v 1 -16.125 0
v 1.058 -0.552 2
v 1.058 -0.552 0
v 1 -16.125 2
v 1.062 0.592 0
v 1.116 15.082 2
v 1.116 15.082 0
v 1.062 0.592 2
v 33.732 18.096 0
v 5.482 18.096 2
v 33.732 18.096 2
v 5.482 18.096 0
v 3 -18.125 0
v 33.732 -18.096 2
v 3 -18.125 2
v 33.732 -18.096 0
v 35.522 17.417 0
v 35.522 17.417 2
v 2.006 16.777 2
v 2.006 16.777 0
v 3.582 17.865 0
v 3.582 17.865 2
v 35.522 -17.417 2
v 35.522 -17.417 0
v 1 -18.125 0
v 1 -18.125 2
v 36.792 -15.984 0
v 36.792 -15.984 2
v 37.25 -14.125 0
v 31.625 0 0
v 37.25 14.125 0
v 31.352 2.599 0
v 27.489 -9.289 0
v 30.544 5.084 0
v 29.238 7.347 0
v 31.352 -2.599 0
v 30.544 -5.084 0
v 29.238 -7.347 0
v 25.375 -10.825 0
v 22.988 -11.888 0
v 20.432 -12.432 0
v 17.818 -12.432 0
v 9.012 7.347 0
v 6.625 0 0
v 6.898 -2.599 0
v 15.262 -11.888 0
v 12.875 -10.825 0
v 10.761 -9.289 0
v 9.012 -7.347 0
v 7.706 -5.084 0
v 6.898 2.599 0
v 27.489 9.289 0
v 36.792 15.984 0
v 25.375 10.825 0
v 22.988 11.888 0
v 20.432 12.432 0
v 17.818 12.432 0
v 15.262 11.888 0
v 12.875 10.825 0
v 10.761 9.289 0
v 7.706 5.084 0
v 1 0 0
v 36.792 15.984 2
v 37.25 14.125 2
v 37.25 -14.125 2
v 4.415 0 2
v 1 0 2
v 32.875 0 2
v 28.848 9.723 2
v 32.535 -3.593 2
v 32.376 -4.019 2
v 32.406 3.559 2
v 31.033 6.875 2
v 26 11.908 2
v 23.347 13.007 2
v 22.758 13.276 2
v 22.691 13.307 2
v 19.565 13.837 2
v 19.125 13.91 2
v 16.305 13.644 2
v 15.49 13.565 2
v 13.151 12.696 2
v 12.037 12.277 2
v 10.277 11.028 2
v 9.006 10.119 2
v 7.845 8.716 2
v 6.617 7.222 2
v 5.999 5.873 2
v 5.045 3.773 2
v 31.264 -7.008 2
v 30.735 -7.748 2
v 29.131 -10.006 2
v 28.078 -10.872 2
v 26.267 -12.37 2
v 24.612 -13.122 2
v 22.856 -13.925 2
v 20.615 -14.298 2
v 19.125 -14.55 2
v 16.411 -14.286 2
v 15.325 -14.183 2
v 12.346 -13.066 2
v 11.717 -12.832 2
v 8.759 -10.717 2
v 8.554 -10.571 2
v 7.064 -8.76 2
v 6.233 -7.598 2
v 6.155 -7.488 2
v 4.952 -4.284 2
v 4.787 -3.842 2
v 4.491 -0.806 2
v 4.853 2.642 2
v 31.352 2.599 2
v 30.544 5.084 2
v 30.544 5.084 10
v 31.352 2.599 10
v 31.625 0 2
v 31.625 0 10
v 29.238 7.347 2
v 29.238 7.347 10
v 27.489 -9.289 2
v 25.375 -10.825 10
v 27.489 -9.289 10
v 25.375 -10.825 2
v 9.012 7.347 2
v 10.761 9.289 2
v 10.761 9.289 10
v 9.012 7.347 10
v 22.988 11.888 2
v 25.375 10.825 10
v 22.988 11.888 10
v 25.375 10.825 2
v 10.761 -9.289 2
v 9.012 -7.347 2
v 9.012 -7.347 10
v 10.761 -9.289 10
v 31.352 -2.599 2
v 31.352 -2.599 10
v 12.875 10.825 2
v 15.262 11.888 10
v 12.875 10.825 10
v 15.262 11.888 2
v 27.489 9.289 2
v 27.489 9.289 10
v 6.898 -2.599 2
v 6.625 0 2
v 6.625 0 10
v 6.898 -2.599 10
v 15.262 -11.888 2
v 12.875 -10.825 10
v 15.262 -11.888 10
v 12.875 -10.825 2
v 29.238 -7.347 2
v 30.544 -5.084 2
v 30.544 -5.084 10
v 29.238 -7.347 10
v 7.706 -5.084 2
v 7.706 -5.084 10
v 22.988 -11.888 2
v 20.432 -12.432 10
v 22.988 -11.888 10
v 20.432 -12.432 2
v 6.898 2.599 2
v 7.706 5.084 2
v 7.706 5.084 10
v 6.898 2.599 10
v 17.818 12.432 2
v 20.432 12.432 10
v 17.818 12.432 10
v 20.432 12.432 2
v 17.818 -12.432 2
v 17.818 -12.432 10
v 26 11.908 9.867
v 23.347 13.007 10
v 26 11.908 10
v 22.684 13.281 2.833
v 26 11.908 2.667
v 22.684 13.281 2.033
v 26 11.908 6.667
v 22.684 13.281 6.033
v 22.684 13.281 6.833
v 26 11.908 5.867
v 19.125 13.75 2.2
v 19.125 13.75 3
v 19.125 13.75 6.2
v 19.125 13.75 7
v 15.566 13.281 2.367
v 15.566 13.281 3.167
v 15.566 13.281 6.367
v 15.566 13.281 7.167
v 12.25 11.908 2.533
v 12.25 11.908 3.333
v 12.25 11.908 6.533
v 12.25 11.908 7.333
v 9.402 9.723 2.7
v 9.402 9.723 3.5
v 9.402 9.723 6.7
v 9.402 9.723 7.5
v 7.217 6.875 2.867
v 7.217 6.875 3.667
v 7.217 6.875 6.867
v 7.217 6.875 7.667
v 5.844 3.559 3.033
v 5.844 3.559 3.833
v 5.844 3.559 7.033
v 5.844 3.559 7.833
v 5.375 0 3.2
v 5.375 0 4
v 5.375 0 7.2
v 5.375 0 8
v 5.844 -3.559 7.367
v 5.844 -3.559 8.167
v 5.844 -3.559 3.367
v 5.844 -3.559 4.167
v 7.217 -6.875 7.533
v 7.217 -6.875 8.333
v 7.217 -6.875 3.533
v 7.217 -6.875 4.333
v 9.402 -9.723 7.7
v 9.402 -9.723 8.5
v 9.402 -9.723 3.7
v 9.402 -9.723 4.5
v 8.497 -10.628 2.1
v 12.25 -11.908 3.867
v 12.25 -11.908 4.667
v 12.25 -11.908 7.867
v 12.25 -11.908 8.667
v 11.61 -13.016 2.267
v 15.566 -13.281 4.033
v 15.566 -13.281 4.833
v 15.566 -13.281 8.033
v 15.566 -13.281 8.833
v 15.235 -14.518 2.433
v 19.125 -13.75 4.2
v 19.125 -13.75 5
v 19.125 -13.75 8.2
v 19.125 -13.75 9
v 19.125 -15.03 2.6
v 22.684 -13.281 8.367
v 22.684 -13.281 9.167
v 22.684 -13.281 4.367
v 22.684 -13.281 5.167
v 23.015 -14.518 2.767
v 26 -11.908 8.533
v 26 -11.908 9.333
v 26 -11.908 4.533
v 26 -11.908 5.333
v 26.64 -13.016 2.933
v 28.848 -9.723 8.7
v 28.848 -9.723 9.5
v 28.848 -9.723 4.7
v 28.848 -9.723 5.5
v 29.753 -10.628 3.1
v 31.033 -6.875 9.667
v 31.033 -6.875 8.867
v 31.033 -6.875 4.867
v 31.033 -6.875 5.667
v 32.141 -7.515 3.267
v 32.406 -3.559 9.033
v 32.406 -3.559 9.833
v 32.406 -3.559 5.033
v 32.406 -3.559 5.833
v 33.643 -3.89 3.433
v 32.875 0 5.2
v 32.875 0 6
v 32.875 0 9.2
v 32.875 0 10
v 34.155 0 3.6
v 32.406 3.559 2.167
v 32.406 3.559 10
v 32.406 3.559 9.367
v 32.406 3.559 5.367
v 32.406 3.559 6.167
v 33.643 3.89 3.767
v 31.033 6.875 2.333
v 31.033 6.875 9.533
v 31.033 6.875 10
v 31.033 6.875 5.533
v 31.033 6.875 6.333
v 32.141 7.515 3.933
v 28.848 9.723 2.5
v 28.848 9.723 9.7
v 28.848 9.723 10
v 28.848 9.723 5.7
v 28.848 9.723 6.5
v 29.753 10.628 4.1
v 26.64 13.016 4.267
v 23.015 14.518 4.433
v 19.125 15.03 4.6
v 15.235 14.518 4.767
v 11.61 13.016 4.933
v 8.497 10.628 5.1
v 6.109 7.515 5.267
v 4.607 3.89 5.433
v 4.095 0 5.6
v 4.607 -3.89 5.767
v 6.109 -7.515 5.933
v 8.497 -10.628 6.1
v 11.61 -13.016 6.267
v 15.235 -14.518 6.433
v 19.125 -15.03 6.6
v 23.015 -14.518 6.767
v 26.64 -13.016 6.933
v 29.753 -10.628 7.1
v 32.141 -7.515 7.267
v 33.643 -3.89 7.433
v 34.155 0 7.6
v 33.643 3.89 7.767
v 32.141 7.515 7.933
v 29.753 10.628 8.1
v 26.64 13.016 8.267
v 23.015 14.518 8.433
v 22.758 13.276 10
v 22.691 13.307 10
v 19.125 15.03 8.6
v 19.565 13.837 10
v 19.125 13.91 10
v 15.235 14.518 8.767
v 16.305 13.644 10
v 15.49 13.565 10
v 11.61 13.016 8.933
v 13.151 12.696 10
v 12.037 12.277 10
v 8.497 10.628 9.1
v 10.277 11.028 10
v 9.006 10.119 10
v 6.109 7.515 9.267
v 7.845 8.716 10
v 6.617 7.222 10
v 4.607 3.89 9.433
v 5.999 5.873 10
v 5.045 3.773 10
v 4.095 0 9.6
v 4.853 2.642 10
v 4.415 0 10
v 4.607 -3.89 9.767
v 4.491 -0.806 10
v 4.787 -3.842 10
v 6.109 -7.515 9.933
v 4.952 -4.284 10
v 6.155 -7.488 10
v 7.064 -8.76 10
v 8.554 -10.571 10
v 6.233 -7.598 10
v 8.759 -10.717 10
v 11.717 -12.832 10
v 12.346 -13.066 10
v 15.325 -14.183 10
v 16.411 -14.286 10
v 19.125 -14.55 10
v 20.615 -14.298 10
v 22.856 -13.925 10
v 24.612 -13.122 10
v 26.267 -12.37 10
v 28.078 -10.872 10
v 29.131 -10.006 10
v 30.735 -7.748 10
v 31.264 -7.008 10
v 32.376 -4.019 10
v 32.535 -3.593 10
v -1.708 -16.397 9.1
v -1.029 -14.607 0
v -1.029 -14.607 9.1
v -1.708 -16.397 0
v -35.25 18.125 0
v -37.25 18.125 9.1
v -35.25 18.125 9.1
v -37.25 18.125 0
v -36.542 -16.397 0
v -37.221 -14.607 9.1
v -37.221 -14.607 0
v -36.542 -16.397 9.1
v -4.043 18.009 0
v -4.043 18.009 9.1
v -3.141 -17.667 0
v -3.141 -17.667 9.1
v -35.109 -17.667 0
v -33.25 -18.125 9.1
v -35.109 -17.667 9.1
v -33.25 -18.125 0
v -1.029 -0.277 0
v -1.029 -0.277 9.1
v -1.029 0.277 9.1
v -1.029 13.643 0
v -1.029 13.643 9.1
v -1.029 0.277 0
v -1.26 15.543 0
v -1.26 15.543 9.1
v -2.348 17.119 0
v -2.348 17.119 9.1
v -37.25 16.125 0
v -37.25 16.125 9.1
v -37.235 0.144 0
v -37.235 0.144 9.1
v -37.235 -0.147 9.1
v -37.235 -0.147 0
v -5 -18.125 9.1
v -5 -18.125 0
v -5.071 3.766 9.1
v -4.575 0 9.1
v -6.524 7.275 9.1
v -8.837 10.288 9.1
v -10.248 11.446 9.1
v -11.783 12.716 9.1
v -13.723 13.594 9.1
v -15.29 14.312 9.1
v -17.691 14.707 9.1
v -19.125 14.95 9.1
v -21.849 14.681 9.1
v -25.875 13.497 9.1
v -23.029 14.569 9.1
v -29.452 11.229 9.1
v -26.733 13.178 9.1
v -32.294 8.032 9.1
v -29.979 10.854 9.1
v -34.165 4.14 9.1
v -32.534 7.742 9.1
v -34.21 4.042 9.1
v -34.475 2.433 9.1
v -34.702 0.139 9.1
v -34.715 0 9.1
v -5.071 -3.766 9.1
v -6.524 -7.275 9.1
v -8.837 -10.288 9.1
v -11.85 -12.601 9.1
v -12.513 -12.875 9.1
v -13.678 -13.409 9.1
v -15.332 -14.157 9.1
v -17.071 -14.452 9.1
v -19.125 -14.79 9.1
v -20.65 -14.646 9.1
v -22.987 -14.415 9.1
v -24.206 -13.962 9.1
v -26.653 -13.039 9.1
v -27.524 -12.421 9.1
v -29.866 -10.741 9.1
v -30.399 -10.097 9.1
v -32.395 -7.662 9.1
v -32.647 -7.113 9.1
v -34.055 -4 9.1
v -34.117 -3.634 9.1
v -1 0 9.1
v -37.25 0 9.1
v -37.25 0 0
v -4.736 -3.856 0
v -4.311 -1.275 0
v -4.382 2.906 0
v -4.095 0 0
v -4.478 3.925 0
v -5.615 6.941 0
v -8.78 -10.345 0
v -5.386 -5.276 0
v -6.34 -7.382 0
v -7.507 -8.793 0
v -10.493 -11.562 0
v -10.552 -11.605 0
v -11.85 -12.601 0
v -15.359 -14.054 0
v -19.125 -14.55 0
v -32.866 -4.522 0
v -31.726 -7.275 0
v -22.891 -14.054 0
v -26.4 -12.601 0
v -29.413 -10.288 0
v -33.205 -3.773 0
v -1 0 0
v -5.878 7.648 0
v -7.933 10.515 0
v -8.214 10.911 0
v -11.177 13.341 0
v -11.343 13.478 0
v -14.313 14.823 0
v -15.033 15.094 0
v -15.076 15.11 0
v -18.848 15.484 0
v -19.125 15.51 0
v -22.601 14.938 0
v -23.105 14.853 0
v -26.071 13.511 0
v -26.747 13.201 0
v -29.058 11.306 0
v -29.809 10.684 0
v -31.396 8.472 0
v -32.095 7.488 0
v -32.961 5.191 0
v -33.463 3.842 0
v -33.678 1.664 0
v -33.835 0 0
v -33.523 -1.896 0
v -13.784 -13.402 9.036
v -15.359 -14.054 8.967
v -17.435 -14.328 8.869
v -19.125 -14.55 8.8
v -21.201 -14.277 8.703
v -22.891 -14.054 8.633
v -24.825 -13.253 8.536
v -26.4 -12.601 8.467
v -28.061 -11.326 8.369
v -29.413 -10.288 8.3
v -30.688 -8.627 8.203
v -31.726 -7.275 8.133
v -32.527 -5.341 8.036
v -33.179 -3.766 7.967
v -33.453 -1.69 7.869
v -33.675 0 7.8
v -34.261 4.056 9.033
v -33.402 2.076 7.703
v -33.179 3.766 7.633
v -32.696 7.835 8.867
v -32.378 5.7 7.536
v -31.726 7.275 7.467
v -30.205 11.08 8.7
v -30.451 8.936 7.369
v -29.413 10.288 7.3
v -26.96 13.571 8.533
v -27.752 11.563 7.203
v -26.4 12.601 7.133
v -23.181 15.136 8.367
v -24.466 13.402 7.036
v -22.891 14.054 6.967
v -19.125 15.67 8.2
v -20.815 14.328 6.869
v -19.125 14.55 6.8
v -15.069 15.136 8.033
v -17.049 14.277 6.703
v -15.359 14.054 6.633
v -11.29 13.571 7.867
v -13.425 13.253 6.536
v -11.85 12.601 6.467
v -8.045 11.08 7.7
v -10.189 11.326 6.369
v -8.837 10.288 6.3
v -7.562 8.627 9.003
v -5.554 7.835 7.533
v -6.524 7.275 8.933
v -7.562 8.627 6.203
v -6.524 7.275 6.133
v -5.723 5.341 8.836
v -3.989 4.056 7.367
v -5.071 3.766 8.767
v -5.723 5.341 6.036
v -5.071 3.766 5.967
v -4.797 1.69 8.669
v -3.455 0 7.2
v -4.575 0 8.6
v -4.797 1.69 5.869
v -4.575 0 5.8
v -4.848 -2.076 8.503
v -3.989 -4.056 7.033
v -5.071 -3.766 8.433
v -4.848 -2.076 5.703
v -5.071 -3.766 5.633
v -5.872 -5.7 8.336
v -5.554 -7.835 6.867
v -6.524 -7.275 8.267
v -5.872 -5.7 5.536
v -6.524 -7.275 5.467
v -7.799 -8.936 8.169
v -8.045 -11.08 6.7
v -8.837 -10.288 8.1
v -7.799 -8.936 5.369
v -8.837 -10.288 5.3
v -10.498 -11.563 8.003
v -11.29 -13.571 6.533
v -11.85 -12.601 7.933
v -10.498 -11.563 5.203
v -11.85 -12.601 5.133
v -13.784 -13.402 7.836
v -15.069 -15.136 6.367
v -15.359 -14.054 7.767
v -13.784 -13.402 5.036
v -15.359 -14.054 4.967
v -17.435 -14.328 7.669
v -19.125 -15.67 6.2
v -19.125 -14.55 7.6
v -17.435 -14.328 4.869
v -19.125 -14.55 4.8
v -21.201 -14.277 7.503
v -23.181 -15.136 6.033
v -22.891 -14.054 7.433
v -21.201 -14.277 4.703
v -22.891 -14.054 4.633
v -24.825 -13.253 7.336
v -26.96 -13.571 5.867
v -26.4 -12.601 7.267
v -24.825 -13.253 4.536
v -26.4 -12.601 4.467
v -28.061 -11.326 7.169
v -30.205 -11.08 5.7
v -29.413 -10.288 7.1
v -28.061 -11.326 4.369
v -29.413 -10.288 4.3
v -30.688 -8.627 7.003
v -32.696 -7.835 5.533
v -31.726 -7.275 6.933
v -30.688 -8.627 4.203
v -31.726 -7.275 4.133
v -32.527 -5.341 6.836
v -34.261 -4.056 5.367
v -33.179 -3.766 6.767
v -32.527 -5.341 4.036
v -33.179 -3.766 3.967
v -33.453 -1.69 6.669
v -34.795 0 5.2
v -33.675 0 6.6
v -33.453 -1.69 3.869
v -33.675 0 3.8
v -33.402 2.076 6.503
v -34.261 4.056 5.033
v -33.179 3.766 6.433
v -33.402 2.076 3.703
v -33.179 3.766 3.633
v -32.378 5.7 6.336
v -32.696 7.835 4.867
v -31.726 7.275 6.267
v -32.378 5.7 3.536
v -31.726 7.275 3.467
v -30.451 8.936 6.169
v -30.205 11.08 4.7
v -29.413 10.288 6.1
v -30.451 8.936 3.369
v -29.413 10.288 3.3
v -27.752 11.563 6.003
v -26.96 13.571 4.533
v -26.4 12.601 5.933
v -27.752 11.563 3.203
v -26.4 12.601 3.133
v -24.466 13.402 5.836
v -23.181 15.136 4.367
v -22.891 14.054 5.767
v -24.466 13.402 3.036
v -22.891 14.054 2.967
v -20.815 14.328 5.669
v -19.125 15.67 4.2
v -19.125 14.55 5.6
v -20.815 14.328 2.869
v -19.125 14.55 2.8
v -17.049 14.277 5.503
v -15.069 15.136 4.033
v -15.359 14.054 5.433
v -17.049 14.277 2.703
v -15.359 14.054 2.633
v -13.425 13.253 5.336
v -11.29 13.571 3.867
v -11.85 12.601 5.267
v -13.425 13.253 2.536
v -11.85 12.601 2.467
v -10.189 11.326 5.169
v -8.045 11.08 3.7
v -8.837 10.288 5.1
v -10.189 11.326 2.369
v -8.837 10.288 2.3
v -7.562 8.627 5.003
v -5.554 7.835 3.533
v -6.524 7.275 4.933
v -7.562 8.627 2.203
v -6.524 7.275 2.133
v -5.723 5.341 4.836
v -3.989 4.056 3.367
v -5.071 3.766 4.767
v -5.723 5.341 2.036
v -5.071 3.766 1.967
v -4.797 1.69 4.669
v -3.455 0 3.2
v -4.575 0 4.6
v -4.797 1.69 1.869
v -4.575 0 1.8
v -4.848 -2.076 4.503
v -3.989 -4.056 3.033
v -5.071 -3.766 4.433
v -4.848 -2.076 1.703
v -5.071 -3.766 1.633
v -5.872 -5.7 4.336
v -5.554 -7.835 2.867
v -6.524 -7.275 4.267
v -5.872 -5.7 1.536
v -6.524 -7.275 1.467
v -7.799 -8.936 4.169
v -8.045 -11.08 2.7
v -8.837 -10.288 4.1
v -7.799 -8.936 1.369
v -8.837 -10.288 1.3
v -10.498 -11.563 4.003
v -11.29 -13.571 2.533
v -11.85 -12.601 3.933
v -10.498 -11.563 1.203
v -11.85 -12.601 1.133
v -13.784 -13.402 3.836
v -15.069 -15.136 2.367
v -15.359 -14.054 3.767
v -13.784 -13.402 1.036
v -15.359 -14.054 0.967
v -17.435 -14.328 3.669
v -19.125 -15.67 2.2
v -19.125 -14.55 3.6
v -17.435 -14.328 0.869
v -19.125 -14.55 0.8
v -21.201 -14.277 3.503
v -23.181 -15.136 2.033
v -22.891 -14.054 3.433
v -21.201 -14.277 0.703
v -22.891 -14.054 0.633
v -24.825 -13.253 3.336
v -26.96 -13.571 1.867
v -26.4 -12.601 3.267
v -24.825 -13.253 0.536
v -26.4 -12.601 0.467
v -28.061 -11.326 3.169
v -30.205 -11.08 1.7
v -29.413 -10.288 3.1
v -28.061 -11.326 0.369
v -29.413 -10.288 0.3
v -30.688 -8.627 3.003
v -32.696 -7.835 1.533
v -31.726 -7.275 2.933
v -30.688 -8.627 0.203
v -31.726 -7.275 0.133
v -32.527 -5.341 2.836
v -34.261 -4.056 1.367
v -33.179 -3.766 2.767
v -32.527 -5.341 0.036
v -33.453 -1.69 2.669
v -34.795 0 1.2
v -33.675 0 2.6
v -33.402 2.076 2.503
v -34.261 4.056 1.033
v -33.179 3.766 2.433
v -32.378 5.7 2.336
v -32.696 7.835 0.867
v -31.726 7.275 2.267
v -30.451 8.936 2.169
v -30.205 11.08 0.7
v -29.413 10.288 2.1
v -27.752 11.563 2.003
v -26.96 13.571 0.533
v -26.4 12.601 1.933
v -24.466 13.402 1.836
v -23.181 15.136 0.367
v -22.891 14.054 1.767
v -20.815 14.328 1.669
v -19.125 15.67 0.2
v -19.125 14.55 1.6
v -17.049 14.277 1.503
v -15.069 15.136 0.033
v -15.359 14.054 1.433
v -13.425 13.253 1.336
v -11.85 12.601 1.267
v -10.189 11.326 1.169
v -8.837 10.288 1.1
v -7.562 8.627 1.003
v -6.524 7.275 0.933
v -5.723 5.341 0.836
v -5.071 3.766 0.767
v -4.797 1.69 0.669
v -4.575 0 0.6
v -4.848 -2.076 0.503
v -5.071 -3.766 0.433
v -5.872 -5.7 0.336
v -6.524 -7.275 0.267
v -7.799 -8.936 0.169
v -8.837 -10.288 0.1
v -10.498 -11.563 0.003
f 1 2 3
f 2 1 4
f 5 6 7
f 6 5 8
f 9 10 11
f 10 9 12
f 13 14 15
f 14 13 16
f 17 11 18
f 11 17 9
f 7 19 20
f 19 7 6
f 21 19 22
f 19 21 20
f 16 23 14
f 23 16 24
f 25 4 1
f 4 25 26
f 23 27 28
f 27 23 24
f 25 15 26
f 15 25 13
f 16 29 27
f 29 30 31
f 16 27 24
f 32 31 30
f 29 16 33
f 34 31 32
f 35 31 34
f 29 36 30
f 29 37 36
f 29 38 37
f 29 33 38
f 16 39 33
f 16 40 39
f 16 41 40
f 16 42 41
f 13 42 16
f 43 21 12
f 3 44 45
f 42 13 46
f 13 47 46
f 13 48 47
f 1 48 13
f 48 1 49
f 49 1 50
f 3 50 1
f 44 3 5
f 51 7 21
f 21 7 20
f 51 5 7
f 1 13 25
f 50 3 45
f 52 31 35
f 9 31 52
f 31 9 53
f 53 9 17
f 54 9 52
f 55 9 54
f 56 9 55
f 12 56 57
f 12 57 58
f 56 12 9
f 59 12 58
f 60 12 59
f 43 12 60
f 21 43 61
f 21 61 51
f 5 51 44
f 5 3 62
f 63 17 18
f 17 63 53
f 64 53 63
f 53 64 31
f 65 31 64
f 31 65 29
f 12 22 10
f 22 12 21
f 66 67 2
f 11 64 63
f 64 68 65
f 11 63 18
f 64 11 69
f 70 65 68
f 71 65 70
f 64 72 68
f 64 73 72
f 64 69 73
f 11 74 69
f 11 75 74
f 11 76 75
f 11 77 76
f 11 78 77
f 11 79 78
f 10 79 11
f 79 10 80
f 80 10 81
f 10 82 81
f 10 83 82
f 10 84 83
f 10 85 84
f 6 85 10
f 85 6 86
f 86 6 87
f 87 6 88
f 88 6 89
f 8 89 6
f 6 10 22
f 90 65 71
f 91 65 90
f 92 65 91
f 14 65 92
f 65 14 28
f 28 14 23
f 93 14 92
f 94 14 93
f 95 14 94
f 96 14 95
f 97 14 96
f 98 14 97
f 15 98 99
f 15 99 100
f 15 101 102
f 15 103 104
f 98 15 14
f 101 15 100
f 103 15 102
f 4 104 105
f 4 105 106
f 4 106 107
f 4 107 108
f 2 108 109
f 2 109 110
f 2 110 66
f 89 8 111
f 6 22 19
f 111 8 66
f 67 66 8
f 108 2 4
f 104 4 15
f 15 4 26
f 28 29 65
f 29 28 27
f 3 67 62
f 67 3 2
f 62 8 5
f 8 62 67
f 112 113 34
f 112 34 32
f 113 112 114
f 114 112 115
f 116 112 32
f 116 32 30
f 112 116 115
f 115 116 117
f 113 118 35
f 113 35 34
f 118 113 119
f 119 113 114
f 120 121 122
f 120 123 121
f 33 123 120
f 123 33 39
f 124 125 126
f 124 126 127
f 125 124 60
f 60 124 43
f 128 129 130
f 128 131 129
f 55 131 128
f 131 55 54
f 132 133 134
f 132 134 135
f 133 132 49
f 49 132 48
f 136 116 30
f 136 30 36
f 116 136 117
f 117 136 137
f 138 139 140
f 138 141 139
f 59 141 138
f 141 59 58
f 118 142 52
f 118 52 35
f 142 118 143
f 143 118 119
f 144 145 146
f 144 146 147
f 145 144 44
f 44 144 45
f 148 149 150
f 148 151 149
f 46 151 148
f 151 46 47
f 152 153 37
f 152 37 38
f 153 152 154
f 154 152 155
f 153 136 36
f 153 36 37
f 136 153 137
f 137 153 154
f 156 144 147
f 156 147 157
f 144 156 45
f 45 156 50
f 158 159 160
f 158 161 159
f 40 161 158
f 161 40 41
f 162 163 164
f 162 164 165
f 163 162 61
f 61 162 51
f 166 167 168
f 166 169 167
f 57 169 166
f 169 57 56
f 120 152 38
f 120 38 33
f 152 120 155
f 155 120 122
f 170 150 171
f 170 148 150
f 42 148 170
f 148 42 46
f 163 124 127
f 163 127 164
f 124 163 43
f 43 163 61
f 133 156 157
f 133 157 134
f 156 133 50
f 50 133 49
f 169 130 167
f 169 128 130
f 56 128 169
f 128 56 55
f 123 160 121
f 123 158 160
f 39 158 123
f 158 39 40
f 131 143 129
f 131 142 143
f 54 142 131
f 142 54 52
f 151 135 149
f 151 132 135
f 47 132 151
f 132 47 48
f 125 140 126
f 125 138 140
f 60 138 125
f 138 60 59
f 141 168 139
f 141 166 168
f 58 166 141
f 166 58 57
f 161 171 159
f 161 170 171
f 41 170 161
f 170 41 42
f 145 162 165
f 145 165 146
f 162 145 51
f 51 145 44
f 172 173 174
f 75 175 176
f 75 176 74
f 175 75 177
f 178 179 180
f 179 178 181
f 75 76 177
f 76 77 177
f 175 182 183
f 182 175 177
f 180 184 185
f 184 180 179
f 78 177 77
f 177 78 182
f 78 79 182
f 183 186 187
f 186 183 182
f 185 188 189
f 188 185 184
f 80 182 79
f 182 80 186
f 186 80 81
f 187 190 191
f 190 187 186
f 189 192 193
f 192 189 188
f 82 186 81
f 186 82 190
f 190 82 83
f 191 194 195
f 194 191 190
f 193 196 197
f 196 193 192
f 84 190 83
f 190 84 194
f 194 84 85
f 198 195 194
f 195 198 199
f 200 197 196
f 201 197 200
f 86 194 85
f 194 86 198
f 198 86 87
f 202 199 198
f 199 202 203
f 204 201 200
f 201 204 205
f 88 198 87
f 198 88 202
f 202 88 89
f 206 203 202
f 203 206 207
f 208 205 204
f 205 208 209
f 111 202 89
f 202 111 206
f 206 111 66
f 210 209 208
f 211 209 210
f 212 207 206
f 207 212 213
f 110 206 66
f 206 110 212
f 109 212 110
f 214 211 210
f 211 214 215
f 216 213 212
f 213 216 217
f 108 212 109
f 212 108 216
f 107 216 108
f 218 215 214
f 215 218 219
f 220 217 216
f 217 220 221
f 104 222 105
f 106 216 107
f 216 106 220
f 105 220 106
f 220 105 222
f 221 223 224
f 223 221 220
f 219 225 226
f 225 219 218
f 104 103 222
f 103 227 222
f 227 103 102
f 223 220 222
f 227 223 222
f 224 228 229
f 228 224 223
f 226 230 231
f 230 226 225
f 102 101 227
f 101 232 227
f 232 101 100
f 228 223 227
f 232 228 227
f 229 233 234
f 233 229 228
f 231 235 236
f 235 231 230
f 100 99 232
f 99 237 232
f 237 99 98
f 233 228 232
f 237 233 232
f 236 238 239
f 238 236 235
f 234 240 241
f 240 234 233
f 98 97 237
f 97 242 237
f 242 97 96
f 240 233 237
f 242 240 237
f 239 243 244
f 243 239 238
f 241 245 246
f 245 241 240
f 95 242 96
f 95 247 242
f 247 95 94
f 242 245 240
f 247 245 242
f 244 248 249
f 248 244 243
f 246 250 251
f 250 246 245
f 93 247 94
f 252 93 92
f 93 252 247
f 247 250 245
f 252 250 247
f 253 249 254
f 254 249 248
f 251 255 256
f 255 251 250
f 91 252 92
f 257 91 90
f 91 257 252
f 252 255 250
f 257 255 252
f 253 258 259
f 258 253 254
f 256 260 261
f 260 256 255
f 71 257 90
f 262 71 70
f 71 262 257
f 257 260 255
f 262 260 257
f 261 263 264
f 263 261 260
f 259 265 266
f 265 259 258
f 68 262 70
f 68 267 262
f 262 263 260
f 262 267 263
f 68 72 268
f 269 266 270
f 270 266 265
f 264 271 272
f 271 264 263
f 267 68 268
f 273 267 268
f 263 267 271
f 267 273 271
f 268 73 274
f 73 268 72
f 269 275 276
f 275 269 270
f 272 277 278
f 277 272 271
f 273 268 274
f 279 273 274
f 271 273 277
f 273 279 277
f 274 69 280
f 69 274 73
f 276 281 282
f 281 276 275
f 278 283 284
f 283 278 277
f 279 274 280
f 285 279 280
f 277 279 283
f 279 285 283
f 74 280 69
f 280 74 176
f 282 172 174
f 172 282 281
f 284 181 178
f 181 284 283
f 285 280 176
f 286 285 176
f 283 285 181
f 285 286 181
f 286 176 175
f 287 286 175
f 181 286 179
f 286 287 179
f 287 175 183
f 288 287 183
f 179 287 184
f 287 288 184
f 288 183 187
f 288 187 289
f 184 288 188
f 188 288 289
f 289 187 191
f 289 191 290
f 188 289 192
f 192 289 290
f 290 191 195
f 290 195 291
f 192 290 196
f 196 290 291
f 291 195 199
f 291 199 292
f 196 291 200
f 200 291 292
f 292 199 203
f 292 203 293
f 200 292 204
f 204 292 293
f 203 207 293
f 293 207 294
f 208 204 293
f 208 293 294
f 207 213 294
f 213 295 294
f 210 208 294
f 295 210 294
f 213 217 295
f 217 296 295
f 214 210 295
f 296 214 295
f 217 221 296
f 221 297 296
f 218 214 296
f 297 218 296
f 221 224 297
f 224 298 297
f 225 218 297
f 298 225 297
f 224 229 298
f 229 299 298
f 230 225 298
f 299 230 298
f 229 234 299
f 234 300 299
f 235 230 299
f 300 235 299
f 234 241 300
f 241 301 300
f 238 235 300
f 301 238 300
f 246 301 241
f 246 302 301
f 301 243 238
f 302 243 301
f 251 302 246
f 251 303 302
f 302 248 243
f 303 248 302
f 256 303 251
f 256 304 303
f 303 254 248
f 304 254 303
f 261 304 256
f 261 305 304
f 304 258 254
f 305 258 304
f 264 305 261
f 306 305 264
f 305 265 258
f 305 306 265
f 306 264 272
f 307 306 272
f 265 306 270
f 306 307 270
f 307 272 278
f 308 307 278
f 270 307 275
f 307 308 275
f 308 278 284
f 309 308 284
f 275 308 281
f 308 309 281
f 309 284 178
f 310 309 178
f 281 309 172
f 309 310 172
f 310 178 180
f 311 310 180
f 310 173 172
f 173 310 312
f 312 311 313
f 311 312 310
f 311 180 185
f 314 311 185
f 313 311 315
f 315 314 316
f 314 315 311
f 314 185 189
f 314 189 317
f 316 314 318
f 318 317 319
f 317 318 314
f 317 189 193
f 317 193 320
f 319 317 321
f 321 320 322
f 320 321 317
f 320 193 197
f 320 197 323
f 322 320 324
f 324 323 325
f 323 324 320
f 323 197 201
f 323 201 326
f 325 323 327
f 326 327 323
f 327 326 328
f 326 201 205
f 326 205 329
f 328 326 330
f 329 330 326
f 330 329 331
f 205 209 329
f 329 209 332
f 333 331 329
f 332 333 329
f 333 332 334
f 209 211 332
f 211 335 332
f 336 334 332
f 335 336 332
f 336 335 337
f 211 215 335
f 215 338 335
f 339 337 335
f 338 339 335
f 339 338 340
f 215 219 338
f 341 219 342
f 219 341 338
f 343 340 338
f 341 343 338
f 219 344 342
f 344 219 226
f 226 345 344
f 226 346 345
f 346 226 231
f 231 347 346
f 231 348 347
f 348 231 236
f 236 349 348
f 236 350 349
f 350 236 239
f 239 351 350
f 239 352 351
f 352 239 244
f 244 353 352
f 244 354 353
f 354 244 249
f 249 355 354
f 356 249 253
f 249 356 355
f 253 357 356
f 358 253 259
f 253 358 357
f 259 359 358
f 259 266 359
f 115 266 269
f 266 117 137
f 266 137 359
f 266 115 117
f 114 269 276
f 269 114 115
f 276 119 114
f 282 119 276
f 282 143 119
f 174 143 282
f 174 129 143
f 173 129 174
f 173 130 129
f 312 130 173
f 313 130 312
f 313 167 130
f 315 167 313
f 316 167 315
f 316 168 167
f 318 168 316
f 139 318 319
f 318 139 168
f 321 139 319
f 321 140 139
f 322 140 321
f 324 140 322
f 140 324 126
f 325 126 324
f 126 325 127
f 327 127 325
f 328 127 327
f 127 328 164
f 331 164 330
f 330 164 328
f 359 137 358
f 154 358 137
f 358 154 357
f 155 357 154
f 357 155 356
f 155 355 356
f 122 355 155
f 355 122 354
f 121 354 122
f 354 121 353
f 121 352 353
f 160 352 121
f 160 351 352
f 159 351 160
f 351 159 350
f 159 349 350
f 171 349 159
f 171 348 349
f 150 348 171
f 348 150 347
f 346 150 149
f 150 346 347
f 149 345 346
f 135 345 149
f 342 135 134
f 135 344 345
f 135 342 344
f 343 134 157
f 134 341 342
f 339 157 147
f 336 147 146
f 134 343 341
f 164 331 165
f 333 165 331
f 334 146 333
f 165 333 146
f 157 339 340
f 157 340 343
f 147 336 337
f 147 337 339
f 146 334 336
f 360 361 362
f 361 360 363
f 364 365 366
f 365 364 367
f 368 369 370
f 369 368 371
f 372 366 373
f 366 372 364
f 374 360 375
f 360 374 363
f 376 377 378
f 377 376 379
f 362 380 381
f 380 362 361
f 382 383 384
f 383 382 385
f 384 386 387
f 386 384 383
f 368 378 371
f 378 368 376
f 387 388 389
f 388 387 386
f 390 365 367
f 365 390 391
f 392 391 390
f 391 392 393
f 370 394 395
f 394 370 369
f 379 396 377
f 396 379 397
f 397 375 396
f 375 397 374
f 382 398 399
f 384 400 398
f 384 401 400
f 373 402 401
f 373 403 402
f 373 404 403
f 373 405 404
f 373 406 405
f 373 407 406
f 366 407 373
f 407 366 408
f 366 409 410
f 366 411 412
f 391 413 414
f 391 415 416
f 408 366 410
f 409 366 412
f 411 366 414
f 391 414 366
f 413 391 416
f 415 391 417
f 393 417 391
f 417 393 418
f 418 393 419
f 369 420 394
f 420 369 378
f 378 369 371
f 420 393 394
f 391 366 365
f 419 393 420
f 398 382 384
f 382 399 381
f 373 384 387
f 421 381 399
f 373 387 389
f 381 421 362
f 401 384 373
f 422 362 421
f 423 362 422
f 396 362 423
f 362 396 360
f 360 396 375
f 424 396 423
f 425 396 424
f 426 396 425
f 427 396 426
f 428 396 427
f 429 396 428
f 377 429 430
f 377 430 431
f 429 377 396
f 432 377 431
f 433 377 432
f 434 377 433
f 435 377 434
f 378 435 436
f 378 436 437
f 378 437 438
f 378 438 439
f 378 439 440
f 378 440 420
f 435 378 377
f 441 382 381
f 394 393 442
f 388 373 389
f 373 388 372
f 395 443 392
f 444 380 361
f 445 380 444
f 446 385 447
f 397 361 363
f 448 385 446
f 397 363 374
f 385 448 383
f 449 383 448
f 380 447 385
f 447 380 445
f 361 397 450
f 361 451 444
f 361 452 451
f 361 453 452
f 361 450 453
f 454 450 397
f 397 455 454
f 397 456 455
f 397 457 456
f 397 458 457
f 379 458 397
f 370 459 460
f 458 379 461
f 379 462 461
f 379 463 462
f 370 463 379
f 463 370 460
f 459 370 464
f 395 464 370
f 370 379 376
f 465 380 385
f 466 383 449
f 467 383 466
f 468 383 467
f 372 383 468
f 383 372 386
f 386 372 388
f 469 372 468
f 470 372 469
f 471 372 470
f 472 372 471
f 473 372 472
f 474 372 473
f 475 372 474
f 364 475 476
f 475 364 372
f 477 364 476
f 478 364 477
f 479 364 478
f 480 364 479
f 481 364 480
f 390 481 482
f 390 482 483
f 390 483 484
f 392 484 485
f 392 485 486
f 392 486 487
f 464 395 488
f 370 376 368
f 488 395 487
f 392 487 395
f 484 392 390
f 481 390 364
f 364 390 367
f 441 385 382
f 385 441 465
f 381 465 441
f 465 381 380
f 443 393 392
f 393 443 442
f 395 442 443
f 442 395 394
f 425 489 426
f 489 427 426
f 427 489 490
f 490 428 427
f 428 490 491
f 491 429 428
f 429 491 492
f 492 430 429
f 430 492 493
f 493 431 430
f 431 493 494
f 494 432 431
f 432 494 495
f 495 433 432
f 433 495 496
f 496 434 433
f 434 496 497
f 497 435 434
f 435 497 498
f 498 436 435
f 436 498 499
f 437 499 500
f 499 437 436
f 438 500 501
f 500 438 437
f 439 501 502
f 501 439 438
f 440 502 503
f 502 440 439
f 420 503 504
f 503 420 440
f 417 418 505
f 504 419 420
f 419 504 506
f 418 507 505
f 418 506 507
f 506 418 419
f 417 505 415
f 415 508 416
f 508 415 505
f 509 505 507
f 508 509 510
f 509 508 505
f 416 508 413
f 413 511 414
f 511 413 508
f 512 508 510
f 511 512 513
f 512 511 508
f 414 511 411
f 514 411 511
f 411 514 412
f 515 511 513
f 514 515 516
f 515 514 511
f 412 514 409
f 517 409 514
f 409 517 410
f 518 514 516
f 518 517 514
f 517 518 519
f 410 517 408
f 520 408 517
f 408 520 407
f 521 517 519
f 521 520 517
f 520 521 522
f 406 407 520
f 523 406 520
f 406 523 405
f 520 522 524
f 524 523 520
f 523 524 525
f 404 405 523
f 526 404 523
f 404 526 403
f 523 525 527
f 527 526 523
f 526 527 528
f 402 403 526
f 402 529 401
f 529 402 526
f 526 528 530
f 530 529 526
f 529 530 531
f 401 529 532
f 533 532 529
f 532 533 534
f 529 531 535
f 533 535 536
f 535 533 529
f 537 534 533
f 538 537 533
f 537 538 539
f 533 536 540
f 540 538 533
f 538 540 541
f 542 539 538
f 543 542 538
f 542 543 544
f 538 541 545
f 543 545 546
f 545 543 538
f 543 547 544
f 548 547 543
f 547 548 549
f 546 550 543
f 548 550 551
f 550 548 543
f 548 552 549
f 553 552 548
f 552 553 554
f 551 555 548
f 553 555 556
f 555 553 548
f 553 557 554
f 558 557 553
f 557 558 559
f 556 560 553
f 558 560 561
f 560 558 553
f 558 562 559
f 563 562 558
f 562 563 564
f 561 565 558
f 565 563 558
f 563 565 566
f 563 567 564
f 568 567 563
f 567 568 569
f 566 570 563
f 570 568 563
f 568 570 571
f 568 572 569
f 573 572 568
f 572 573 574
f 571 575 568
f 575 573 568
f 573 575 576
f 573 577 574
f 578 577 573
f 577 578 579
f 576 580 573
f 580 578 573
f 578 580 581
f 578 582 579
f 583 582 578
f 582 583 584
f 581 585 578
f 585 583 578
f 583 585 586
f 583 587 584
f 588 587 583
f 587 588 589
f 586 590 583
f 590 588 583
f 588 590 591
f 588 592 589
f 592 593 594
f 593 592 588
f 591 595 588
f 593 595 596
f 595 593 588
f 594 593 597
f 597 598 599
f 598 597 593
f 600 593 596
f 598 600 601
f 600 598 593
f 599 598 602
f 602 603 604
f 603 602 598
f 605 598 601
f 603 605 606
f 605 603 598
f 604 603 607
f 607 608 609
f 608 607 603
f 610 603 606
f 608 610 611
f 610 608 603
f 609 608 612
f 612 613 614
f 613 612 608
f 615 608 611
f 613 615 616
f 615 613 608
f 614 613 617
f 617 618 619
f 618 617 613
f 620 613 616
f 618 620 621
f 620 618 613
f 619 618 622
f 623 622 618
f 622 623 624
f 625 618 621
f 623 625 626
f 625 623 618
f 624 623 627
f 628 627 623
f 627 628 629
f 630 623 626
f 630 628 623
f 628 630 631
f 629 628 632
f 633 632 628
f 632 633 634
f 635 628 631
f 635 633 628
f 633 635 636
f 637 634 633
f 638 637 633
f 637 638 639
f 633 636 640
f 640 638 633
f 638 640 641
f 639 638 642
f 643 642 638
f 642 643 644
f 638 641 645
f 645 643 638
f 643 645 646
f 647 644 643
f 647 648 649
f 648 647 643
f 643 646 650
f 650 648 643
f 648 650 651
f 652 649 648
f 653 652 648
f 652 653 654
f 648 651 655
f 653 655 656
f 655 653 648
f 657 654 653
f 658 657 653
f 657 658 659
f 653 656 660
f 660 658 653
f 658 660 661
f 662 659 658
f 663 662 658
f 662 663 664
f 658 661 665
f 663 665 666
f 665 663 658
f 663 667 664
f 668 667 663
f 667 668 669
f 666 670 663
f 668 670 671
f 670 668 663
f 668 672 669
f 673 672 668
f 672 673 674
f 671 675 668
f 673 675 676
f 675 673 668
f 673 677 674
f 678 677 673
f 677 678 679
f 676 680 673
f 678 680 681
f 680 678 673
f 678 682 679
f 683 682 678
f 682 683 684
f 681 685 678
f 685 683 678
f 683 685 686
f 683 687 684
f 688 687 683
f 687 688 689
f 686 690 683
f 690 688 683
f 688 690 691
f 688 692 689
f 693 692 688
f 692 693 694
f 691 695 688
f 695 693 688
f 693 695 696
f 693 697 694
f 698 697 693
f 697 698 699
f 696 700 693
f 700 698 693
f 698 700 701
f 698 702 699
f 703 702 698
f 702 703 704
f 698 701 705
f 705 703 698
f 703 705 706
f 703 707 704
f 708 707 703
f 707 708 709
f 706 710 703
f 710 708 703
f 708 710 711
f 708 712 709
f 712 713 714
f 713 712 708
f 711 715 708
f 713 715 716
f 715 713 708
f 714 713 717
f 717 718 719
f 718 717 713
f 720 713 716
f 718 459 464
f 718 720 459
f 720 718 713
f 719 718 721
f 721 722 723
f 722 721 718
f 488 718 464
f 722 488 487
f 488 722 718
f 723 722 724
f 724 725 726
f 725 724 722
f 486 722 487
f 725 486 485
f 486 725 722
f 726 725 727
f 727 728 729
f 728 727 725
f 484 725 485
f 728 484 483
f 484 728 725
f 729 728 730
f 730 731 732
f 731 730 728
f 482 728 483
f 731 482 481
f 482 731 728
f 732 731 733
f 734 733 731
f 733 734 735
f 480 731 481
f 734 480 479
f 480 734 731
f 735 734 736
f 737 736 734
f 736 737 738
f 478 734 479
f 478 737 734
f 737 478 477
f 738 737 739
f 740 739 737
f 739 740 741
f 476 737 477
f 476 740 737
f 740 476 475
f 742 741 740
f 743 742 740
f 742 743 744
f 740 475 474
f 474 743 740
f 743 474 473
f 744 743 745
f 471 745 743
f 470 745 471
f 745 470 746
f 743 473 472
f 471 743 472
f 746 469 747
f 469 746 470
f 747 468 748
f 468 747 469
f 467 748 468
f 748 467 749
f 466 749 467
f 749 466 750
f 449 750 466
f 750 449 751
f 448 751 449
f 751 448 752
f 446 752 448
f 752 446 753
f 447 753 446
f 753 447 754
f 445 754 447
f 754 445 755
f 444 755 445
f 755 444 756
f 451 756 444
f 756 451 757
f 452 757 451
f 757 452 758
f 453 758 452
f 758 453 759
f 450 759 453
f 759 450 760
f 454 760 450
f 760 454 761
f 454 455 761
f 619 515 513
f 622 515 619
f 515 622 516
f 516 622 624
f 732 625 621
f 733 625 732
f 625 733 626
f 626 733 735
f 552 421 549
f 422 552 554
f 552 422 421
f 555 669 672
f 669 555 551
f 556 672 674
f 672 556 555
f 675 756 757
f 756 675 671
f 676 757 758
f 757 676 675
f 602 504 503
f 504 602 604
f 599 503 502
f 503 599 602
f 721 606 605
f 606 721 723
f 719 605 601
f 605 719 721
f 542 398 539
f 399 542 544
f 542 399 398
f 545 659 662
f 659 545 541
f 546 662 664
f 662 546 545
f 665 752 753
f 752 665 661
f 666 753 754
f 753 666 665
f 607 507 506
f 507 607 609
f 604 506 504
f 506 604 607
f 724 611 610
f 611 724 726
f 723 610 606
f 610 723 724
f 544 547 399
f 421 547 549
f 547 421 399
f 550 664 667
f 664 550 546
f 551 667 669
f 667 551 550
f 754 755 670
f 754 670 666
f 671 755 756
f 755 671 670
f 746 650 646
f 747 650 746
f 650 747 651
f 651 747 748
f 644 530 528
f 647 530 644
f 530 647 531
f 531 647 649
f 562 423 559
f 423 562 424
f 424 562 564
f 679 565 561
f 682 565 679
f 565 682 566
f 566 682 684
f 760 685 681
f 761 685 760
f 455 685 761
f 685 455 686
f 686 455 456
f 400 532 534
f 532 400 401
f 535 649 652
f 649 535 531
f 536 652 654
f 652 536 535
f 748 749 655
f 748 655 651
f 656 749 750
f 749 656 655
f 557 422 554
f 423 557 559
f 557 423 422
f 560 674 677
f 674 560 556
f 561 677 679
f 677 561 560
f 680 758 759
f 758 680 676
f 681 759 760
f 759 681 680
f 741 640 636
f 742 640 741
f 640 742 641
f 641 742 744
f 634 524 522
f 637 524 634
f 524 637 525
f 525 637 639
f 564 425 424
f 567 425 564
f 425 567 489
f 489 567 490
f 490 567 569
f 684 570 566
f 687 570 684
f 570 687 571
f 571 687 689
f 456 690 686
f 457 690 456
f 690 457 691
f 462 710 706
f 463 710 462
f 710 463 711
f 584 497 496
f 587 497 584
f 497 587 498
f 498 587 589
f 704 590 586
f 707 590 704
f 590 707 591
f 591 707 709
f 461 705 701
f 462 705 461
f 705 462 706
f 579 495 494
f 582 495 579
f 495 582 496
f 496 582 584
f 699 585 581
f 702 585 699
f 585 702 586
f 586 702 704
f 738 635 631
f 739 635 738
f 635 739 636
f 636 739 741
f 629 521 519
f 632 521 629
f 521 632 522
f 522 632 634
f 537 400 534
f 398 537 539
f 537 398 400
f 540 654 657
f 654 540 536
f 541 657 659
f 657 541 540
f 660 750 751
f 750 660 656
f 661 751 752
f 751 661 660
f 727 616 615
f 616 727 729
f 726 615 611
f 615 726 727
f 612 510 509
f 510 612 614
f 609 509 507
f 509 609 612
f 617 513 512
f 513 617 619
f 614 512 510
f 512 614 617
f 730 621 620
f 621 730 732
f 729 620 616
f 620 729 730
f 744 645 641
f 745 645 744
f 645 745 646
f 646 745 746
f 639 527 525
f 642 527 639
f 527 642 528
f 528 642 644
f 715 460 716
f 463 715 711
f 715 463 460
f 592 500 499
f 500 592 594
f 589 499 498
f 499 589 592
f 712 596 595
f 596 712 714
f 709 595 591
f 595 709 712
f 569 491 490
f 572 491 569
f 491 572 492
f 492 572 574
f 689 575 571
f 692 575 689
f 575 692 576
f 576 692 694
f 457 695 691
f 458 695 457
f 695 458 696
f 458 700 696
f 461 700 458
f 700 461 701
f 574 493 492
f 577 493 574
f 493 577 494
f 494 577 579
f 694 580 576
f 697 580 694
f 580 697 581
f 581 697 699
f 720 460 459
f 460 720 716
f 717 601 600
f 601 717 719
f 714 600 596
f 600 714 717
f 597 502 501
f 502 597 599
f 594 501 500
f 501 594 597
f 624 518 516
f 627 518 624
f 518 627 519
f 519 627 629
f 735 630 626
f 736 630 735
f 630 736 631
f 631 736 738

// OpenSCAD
// file: OLT_Thread_Module.scad
// OpenSCAD screw thread module
// Produced by Jonathan Waite CUED 2013
// jpw54@cam.ac.uk

/*
      |--h--|

  ~  1|\
  |   | \
  |   |  \
  |   |   \
  |   |    \ 2
  |   |     |   ~
  Z1  |     |   |
  |   |     |   |
  |   |    / 3  |   ~
  |   |   /     Z2  |
  |   |  /      |   Z3
  |   | /       |   |
  ~  0|/        ~   ~
*/

/*		//draw intrenal thread
difference(){
	translate([0,0,1])
		cylinder(8,r=15);
		Thread(8,10,2,36,true);
}
*/
/*		//visualise clearance volume
difference(){
	Thread(8,6,2,36,true);
	translate([0,0,0.1]*1.5)
		Thread(8,6,2,36,false);
}
*/
Thread();

module Thread(radius=10,length=8,pitch=2,steps=36,internal=false,
					threadratio=[0.4,1.0,0.5,0.5],		
					tolerance=0.1){
	
	//convert from ratios to lengths, threaddim=[h, z1, z2, z3]
	threaddim=threadratio*pitch;				
	//add to shaft radius for internal thread
	shaftradius=radius+(internal ? tolerance : 0)*pitch;	
														
	difference(){
		union(){
			//shaft infill
			cylinder(length,r=shaftradius,$fn=steps);		
			//add extra thread to be trimmed for smooth thread ends
			translate([0,0,-pitch])
				DrawThread(radius,length+pitch*2,pitch,threaddim,steps,internal,tolerance);
		}								
		//trim bottom of thread
		translate([0,0,-pitch*1.5])
			cylinder(pitch*1.5,r=(radius+threaddim[0])*1.5);	
		//trim top of thread
		translate([0,0,length])
			cylinder(pitch*1.5,r=(radius+threaddim[0])*1.5);	
	}
}

module DrawThread(radius=10,length=8,pitch=2,
							threaddim=[0.8,2.0,1.0,1.0],
							steps=36,internal=false,tolerance=0.1){

	zinc=pitch/steps;
	stepangle=360/steps;
	//draws thread exactly as long as 'length'
	stepstotal=steps*(length/pitch-1);		

		for (stepscurrent=[0:stepstotal-1]) {
			ThreadElement(radius,threaddim,zinc,stepangle,stepscurrent,tolerance,internal);
		}
}

module ThreadElement(radius=10,threaddim=[0.8,2.0,1.0,1.0],
							zinc=2/360,stepangle=5,stepscurrent=0,
							tolerance=0.1, internal=false){

/* Left-hand face of polyhedron (side A, looking towards thread's centre)

      |--h--|

  ~  1|\
  |   | \
  |   |  \
  |   |   \
  |   |    \ 2
  |   |     |   ~
  Z1  |     |   |
  |   |     |   |
  |   |    / 3  |   ~
  |   |   /     Z2  |
  |   |  /      |   Z3
  |   | /       |   |
  ~  0|/        ~   ~

*/ //Right-hand face (side B) is numbered 4:7

	//add clearances to thread
	thread=threaddim*(1+(internal ? tolerance : -tolerance));	

	thetaA=stepangle*stepscurrent;
	thetaB=thetaA+stepangle;
	z0A=zinc*stepscurrent;
	z0B=z0A+zinc;
	xA=cos(thetaA);
	xB=cos(thetaB);
	yA=sin(thetaA);
	yB=sin(thetaB);
	r=radius;
	R=radius+thread[0];	//thread protrudes from shaft
	
	//draw the element
	polyhedron(		
		points=[
			[r*xA,r*yA,z0A],	   		//0
			[r*xA,r*yA,z0A+thread[1]], //1
			[R*xA,R*yA,z0A+thread[2]], //2
			[R*xA,R*yA,z0A+thread[3]], //3
			[r*xB,r*yB,z0B],    			//4
			[r*xB,r*yB,z0B+thread[1]], //5
			[R*xB,R*yB,z0B+thread[2]],	//6
			[R*xB,R*yB,z0B+thread[3]]	//7
		],
		triangles=[
			[0,1,2],
			[0,2,3],	//left
			[0,4,1],
			[1,4,5],	//back
			[0,3,4],
			[4,3,7],	//bottom
			[2,6,3],
			[3,6,7],	//front
			[1,5,2],
			[2,5,6],	//top
			[4,6,5],
			[4,7,6]	//right
		]
	);
}
// main file
use <OLT_Thread_Module.scad>
use <MCAD/regular_shapes.scad>

//screw_connector(22,30,0,45,4);
dia=25;
base=dia*1.45;
length=8;
h_nut=(length+1.1);
h_bolt=2;
radius=4;
bratio=.5;
cone=0;

//screw_connector(dia,35,0,50,threads);


//Bolt
translate([base/2+1,0,0])
	union(){
		difference(){
			union(){
				rotate(0,[0,0,1])
					hull(){
						translate([(base*bratio-radius),(base*bratio-radius),0])
							cylinder(h_bolt,r=radius);
						translate([(base*bratio-radius),-(base*bratio-radius),0])
							cylinder(h_bolt,r=radius);
						translate([-(base*bratio-radius),(base*bratio-radius),0])
							cylinder(h_bolt,r=radius);
						translate([-(base*bratio-1),-(base*bratio-1),h_bolt/2])
							cube([2,2,h_bolt],true);
					}	
				cylinder(h_bolt,r=base/2);	
			}
			translate([0,0,-1])
				cylinder(h_bolt+2,r=dia/2);
		}
		translate([0,0,h_bolt])
			screw_connector(dia,length,0,cone,base);
	}


//Nut
translate([-(base/2+1),0,0])
	difference(){
		difference(){
			union(){
				rotate(-90,[0,0,1])
					hull(){
						translate([(base*bratio-radius),(base*bratio-radius),0])
							cylinder(h_nut,r=radius);
						translate([(base*bratio-radius),-(base*bratio-radius),0])
							cylinder(h_nut,r=radius);
						translate([-(base*bratio-radius),(base*bratio-radius),0])
							cylinder(h_nut,r=radius);
						translate([-(base*bratio-1),-(base*bratio-1),h_nut/2])
							cube([2,2,h_nut],true);
					}		
				cylinder(h_nut,r=base/2);
			}
			translate([0,0,-1])
				cylinder(h_nut+2,r=dia/2+1);		//cut out centre
		}
		translate([0,0,h_nut+0.5])
			rotate(180,[1,0,0])
				screw_connector(dia,length+2,1,cone,base);
//		translate([0,0,h_nut-3])
	//		cylinder(10,r=dia*0.65);	//clearance ring
	}


module screw_connector(dia=40,height=10,inner=0,angle=1,base=55){
	cone_angle=(angle ? 35 : 0);
	pitch=4;
	tol=0.2;
	r_cone=base/2*(1+(inner ? tol : -tol)/1000);
	threadshape=[0.40,1,0.5,0.5];

	t=dia/20;
	D=dia+2*t;
	alpha=tan(cone_angle);
	h_cone=base/2*alpha;
	z=(base-D)/2*alpha-pitch/2;

	difference(){
		union(){
			Thread(D/2,height,pitch,24,inner,threadshape,tol);
			cone(h_cone,r_cone);
		}
		translate([0,0,-1])
			cylinder(max(height,h_cone)+2,r=dia/2);	//cut out centre
	}
}
